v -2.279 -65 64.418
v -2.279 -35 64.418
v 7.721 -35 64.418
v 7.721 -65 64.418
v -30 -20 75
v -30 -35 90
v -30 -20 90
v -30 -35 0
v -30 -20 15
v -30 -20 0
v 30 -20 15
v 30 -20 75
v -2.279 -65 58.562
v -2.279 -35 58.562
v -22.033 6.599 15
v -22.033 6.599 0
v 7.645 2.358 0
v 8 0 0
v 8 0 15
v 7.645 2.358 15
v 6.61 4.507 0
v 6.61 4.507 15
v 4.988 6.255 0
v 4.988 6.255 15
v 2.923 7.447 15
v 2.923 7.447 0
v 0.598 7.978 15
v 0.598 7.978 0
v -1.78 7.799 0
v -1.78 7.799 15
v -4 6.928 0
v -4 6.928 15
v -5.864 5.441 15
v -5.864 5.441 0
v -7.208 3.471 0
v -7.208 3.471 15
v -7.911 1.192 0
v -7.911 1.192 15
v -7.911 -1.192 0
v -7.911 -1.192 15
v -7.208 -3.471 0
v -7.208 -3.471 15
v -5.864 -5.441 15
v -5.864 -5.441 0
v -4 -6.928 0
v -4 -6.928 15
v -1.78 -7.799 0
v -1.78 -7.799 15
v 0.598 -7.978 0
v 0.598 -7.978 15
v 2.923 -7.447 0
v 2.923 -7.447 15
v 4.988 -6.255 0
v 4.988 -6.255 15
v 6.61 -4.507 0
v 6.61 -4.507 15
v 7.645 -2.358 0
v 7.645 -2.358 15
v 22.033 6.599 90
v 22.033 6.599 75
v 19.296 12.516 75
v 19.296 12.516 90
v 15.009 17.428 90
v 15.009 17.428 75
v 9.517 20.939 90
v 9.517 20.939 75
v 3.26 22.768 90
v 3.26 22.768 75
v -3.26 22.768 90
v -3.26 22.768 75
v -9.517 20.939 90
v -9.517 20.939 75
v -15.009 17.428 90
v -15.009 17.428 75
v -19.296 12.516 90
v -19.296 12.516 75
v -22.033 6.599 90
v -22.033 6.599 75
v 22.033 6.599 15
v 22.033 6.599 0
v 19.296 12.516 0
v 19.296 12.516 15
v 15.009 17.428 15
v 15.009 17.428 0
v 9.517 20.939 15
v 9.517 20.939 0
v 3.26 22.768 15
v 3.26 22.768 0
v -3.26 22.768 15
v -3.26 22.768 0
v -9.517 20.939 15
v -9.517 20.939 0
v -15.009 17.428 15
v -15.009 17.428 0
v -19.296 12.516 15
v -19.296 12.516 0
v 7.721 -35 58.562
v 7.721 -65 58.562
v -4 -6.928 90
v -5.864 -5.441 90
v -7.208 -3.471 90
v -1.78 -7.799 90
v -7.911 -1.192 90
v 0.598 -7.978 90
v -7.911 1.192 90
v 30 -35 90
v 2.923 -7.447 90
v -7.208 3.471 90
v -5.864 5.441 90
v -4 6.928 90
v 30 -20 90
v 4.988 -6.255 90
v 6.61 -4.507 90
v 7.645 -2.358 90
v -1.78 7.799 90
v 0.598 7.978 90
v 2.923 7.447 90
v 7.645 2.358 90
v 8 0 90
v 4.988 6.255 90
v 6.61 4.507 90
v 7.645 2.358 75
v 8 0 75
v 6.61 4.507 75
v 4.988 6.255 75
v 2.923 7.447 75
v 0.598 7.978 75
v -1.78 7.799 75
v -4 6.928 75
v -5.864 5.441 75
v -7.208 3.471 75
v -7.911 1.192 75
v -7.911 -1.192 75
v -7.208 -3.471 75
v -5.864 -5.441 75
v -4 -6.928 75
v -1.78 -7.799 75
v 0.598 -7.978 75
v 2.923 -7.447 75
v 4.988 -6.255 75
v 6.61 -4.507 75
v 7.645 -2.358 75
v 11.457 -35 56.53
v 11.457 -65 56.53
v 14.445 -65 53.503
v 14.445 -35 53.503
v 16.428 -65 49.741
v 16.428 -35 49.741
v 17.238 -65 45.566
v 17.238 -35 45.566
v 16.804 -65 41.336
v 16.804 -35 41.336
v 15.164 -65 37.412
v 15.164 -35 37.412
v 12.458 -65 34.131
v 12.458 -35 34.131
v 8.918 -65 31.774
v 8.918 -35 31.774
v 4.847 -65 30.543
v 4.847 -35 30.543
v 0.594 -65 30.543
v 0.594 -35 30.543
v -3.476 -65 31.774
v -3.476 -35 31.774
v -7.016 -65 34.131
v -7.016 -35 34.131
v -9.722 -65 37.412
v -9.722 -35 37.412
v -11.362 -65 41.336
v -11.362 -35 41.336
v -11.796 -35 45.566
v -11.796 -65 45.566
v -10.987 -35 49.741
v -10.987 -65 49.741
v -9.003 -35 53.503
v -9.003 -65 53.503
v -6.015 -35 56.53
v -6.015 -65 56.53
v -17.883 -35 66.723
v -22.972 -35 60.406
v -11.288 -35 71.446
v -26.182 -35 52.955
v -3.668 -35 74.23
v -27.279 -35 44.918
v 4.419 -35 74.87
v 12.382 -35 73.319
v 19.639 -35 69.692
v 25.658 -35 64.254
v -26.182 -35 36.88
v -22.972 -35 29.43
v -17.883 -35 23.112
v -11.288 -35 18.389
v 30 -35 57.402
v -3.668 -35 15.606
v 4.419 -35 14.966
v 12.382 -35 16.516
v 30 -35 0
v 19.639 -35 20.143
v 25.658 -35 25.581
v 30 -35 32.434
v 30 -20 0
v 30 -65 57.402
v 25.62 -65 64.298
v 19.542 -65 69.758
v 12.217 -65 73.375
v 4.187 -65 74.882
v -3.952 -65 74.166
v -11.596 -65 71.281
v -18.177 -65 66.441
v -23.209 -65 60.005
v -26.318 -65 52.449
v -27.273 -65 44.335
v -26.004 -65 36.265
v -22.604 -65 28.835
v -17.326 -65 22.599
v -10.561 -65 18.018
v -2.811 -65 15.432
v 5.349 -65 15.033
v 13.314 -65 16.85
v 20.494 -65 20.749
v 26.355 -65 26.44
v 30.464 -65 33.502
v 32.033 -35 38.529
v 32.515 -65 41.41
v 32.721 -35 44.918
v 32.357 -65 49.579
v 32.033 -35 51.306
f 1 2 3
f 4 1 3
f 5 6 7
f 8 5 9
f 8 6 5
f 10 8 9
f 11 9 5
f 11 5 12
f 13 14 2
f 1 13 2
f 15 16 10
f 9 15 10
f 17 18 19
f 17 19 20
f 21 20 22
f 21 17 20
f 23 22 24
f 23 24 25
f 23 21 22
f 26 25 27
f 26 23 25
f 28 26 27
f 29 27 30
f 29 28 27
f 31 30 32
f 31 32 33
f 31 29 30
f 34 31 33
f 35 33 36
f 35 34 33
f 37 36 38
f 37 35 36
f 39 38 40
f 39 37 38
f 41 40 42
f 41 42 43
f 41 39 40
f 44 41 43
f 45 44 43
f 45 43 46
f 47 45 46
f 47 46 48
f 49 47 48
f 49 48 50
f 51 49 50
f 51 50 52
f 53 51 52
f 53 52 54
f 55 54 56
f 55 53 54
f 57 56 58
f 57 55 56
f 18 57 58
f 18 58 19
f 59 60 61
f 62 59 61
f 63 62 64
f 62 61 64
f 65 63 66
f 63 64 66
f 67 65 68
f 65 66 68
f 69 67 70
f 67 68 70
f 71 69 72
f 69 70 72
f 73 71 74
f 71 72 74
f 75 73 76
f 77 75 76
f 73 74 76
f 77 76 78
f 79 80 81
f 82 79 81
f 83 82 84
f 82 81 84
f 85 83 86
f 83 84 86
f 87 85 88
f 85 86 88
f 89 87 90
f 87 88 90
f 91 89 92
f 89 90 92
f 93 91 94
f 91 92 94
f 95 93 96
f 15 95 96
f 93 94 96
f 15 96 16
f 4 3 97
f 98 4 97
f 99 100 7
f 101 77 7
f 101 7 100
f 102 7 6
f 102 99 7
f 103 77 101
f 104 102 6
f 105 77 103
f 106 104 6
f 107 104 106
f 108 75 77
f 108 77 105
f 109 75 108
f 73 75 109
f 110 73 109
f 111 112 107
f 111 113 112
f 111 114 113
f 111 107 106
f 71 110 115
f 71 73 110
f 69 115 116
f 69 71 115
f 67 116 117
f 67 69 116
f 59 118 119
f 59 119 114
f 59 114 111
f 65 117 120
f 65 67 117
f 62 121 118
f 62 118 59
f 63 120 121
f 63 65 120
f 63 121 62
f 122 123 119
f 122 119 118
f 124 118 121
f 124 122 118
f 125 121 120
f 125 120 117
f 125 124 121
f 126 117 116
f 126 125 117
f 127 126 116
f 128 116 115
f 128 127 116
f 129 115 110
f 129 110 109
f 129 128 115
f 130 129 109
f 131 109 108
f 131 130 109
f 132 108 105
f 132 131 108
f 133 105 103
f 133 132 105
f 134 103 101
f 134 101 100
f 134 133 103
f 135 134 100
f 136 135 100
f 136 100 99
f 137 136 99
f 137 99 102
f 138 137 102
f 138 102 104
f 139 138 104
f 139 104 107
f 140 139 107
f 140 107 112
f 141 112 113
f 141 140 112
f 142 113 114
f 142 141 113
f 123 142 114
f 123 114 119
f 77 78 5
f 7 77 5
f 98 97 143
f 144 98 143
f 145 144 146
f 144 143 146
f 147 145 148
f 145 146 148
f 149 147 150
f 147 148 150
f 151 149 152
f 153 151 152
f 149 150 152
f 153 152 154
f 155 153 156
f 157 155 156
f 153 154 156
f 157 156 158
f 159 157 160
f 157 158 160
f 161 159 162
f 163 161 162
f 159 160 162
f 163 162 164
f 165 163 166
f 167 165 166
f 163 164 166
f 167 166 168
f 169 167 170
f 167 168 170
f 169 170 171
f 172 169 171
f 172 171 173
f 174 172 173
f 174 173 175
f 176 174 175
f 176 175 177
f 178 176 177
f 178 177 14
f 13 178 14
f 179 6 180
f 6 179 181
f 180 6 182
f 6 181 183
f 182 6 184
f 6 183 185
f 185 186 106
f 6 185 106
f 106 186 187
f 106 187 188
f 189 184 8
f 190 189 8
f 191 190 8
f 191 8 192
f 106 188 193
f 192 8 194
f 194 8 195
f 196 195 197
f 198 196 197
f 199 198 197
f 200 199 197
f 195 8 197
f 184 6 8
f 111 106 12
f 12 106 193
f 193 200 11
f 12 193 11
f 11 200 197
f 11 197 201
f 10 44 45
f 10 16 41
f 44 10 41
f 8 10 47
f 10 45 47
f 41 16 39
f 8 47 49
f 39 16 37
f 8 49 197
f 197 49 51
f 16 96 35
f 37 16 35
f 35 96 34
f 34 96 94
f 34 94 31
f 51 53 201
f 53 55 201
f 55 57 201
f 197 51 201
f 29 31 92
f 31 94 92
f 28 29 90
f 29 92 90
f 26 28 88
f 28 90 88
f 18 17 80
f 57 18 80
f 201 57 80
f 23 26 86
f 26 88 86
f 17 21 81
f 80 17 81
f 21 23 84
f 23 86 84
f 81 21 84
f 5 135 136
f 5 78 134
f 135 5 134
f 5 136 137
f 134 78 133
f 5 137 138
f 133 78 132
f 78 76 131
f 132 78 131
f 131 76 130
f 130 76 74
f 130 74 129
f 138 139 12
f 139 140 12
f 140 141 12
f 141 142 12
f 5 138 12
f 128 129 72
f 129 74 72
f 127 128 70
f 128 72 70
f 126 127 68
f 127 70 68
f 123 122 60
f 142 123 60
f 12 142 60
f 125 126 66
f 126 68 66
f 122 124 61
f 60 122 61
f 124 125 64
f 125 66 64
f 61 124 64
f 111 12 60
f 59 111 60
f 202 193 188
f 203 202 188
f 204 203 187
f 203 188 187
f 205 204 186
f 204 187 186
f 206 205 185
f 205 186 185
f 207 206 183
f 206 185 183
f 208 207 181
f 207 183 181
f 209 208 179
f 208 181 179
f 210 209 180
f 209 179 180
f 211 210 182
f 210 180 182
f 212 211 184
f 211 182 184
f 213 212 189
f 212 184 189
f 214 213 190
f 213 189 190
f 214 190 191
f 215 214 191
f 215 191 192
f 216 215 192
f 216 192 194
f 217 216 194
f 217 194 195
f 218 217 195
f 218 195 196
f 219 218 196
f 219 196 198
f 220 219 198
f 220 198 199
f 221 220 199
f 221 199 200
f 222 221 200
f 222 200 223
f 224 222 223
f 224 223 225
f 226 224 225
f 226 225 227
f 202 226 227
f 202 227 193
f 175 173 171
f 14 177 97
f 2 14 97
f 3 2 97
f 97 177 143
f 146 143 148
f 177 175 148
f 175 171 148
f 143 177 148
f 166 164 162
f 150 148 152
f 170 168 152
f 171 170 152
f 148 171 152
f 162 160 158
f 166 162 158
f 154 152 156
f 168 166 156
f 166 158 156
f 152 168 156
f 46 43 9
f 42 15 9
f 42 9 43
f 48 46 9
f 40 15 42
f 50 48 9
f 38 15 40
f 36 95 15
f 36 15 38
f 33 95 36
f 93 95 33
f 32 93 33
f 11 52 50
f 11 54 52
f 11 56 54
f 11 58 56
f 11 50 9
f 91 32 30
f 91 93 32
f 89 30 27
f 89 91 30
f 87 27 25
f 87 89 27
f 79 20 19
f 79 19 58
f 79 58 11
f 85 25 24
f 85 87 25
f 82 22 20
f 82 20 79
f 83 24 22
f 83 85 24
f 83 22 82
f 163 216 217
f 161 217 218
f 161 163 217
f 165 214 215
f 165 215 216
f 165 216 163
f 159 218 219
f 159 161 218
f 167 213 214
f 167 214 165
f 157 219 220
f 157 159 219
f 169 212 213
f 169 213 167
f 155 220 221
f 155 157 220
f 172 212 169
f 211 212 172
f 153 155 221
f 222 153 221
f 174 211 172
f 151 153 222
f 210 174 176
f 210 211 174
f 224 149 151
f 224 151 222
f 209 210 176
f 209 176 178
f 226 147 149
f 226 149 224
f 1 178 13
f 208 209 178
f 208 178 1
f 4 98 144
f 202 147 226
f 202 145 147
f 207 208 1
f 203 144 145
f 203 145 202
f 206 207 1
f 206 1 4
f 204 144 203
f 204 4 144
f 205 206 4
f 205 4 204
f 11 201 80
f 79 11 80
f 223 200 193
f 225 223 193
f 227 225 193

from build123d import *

# Parameters (mm, degrees)
SKETCH1_R           = 8
BOSS_EXTRUDE2_DEPTH = 15
SKETCH1_5_W         = 60
SKETCH1_5_H         = 15
BOSS_EXTRUDE3_DEPTH = 90
BOSS_EXTRUDE4_START = -15
SKETCH2_R           = 8
BOSS_EXTRUDE4_DEPTH = 15
SKETCH3_R           = 30
BOSS_EXTRUDE5_DEPTH = 30


with BuildPart() as part:
    # Sketch1 → Boss-Extrude2 (new body)
    with BuildSketch(Plane.XY):
        with BuildLine():
            Line((-22.03289839, 6.599347585), (-30, -20))
            Line((-30, -20), (30, -20))
            Line((30, -20), (22.03289839, 6.599347585))
            ThreePointArc((22.03289839, 6.599347585), (0, 23), (-22.03289839, 6.599347585))
        make_face()
        Circle(SKETCH1_R, mode=Mode.SUBTRACT)
    extrude(amount=BOSS_EXTRUDE2_DEPTH)

    # Sketch1<5> → Boss-Extrude3 (add)
    with BuildSketch(Plane.XY):
        with Locations((0, -27.5)):
            Rectangle(SKETCH1_5_W, SKETCH1_5_H)
    extrude(amount=BOSS_EXTRUDE3_DEPTH)

    # Sketch2 → Boss-Extrude4 (add)
    with BuildSketch(Plane.XY.offset(90).offset(BOSS_EXTRUDE4_START)):
        with BuildLine():
            Line((-22.03289839, 6.599347585), (-30, -20))
            Line((-30, -20), (30, -20))
            Line((30, -20), (22.03289839, 6.599347585))
            ThreePointArc((22.03289839, 6.599347585), (0, 23), (-22.03289839, 6.599347585))
        make_face()
        Circle(SKETCH2_R, mode=Mode.SUBTRACT)
    extrude(amount=BOSS_EXTRUDE4_DEPTH)

    # Sketch3 → Boss-Extrude5 (add)
    with BuildSketch(Plane.XZ.offset(35)):
        with Locations((2.720866767, 44.917667838)):
            Circle(SKETCH3_R)
        with BuildLine():
            Line((-2.279133233, 58.561813924), (-2.279133233, 64.417667838))
            Line((-2.279133233, 64.417667838), (7.720866767, 64.417667838))
            Line((7.720866767, 64.417667838), (7.720866767, 58.561813924))
            ThreePointArc((7.720866767, 58.561813924), (2.720866767, 30.386228736), (-2.279133233, 58.561813924))
        make_face(mode=Mode.SUBTRACT)
    extrude(amount=BOSS_EXTRUDE5_DEPTH)


solid = part.part
